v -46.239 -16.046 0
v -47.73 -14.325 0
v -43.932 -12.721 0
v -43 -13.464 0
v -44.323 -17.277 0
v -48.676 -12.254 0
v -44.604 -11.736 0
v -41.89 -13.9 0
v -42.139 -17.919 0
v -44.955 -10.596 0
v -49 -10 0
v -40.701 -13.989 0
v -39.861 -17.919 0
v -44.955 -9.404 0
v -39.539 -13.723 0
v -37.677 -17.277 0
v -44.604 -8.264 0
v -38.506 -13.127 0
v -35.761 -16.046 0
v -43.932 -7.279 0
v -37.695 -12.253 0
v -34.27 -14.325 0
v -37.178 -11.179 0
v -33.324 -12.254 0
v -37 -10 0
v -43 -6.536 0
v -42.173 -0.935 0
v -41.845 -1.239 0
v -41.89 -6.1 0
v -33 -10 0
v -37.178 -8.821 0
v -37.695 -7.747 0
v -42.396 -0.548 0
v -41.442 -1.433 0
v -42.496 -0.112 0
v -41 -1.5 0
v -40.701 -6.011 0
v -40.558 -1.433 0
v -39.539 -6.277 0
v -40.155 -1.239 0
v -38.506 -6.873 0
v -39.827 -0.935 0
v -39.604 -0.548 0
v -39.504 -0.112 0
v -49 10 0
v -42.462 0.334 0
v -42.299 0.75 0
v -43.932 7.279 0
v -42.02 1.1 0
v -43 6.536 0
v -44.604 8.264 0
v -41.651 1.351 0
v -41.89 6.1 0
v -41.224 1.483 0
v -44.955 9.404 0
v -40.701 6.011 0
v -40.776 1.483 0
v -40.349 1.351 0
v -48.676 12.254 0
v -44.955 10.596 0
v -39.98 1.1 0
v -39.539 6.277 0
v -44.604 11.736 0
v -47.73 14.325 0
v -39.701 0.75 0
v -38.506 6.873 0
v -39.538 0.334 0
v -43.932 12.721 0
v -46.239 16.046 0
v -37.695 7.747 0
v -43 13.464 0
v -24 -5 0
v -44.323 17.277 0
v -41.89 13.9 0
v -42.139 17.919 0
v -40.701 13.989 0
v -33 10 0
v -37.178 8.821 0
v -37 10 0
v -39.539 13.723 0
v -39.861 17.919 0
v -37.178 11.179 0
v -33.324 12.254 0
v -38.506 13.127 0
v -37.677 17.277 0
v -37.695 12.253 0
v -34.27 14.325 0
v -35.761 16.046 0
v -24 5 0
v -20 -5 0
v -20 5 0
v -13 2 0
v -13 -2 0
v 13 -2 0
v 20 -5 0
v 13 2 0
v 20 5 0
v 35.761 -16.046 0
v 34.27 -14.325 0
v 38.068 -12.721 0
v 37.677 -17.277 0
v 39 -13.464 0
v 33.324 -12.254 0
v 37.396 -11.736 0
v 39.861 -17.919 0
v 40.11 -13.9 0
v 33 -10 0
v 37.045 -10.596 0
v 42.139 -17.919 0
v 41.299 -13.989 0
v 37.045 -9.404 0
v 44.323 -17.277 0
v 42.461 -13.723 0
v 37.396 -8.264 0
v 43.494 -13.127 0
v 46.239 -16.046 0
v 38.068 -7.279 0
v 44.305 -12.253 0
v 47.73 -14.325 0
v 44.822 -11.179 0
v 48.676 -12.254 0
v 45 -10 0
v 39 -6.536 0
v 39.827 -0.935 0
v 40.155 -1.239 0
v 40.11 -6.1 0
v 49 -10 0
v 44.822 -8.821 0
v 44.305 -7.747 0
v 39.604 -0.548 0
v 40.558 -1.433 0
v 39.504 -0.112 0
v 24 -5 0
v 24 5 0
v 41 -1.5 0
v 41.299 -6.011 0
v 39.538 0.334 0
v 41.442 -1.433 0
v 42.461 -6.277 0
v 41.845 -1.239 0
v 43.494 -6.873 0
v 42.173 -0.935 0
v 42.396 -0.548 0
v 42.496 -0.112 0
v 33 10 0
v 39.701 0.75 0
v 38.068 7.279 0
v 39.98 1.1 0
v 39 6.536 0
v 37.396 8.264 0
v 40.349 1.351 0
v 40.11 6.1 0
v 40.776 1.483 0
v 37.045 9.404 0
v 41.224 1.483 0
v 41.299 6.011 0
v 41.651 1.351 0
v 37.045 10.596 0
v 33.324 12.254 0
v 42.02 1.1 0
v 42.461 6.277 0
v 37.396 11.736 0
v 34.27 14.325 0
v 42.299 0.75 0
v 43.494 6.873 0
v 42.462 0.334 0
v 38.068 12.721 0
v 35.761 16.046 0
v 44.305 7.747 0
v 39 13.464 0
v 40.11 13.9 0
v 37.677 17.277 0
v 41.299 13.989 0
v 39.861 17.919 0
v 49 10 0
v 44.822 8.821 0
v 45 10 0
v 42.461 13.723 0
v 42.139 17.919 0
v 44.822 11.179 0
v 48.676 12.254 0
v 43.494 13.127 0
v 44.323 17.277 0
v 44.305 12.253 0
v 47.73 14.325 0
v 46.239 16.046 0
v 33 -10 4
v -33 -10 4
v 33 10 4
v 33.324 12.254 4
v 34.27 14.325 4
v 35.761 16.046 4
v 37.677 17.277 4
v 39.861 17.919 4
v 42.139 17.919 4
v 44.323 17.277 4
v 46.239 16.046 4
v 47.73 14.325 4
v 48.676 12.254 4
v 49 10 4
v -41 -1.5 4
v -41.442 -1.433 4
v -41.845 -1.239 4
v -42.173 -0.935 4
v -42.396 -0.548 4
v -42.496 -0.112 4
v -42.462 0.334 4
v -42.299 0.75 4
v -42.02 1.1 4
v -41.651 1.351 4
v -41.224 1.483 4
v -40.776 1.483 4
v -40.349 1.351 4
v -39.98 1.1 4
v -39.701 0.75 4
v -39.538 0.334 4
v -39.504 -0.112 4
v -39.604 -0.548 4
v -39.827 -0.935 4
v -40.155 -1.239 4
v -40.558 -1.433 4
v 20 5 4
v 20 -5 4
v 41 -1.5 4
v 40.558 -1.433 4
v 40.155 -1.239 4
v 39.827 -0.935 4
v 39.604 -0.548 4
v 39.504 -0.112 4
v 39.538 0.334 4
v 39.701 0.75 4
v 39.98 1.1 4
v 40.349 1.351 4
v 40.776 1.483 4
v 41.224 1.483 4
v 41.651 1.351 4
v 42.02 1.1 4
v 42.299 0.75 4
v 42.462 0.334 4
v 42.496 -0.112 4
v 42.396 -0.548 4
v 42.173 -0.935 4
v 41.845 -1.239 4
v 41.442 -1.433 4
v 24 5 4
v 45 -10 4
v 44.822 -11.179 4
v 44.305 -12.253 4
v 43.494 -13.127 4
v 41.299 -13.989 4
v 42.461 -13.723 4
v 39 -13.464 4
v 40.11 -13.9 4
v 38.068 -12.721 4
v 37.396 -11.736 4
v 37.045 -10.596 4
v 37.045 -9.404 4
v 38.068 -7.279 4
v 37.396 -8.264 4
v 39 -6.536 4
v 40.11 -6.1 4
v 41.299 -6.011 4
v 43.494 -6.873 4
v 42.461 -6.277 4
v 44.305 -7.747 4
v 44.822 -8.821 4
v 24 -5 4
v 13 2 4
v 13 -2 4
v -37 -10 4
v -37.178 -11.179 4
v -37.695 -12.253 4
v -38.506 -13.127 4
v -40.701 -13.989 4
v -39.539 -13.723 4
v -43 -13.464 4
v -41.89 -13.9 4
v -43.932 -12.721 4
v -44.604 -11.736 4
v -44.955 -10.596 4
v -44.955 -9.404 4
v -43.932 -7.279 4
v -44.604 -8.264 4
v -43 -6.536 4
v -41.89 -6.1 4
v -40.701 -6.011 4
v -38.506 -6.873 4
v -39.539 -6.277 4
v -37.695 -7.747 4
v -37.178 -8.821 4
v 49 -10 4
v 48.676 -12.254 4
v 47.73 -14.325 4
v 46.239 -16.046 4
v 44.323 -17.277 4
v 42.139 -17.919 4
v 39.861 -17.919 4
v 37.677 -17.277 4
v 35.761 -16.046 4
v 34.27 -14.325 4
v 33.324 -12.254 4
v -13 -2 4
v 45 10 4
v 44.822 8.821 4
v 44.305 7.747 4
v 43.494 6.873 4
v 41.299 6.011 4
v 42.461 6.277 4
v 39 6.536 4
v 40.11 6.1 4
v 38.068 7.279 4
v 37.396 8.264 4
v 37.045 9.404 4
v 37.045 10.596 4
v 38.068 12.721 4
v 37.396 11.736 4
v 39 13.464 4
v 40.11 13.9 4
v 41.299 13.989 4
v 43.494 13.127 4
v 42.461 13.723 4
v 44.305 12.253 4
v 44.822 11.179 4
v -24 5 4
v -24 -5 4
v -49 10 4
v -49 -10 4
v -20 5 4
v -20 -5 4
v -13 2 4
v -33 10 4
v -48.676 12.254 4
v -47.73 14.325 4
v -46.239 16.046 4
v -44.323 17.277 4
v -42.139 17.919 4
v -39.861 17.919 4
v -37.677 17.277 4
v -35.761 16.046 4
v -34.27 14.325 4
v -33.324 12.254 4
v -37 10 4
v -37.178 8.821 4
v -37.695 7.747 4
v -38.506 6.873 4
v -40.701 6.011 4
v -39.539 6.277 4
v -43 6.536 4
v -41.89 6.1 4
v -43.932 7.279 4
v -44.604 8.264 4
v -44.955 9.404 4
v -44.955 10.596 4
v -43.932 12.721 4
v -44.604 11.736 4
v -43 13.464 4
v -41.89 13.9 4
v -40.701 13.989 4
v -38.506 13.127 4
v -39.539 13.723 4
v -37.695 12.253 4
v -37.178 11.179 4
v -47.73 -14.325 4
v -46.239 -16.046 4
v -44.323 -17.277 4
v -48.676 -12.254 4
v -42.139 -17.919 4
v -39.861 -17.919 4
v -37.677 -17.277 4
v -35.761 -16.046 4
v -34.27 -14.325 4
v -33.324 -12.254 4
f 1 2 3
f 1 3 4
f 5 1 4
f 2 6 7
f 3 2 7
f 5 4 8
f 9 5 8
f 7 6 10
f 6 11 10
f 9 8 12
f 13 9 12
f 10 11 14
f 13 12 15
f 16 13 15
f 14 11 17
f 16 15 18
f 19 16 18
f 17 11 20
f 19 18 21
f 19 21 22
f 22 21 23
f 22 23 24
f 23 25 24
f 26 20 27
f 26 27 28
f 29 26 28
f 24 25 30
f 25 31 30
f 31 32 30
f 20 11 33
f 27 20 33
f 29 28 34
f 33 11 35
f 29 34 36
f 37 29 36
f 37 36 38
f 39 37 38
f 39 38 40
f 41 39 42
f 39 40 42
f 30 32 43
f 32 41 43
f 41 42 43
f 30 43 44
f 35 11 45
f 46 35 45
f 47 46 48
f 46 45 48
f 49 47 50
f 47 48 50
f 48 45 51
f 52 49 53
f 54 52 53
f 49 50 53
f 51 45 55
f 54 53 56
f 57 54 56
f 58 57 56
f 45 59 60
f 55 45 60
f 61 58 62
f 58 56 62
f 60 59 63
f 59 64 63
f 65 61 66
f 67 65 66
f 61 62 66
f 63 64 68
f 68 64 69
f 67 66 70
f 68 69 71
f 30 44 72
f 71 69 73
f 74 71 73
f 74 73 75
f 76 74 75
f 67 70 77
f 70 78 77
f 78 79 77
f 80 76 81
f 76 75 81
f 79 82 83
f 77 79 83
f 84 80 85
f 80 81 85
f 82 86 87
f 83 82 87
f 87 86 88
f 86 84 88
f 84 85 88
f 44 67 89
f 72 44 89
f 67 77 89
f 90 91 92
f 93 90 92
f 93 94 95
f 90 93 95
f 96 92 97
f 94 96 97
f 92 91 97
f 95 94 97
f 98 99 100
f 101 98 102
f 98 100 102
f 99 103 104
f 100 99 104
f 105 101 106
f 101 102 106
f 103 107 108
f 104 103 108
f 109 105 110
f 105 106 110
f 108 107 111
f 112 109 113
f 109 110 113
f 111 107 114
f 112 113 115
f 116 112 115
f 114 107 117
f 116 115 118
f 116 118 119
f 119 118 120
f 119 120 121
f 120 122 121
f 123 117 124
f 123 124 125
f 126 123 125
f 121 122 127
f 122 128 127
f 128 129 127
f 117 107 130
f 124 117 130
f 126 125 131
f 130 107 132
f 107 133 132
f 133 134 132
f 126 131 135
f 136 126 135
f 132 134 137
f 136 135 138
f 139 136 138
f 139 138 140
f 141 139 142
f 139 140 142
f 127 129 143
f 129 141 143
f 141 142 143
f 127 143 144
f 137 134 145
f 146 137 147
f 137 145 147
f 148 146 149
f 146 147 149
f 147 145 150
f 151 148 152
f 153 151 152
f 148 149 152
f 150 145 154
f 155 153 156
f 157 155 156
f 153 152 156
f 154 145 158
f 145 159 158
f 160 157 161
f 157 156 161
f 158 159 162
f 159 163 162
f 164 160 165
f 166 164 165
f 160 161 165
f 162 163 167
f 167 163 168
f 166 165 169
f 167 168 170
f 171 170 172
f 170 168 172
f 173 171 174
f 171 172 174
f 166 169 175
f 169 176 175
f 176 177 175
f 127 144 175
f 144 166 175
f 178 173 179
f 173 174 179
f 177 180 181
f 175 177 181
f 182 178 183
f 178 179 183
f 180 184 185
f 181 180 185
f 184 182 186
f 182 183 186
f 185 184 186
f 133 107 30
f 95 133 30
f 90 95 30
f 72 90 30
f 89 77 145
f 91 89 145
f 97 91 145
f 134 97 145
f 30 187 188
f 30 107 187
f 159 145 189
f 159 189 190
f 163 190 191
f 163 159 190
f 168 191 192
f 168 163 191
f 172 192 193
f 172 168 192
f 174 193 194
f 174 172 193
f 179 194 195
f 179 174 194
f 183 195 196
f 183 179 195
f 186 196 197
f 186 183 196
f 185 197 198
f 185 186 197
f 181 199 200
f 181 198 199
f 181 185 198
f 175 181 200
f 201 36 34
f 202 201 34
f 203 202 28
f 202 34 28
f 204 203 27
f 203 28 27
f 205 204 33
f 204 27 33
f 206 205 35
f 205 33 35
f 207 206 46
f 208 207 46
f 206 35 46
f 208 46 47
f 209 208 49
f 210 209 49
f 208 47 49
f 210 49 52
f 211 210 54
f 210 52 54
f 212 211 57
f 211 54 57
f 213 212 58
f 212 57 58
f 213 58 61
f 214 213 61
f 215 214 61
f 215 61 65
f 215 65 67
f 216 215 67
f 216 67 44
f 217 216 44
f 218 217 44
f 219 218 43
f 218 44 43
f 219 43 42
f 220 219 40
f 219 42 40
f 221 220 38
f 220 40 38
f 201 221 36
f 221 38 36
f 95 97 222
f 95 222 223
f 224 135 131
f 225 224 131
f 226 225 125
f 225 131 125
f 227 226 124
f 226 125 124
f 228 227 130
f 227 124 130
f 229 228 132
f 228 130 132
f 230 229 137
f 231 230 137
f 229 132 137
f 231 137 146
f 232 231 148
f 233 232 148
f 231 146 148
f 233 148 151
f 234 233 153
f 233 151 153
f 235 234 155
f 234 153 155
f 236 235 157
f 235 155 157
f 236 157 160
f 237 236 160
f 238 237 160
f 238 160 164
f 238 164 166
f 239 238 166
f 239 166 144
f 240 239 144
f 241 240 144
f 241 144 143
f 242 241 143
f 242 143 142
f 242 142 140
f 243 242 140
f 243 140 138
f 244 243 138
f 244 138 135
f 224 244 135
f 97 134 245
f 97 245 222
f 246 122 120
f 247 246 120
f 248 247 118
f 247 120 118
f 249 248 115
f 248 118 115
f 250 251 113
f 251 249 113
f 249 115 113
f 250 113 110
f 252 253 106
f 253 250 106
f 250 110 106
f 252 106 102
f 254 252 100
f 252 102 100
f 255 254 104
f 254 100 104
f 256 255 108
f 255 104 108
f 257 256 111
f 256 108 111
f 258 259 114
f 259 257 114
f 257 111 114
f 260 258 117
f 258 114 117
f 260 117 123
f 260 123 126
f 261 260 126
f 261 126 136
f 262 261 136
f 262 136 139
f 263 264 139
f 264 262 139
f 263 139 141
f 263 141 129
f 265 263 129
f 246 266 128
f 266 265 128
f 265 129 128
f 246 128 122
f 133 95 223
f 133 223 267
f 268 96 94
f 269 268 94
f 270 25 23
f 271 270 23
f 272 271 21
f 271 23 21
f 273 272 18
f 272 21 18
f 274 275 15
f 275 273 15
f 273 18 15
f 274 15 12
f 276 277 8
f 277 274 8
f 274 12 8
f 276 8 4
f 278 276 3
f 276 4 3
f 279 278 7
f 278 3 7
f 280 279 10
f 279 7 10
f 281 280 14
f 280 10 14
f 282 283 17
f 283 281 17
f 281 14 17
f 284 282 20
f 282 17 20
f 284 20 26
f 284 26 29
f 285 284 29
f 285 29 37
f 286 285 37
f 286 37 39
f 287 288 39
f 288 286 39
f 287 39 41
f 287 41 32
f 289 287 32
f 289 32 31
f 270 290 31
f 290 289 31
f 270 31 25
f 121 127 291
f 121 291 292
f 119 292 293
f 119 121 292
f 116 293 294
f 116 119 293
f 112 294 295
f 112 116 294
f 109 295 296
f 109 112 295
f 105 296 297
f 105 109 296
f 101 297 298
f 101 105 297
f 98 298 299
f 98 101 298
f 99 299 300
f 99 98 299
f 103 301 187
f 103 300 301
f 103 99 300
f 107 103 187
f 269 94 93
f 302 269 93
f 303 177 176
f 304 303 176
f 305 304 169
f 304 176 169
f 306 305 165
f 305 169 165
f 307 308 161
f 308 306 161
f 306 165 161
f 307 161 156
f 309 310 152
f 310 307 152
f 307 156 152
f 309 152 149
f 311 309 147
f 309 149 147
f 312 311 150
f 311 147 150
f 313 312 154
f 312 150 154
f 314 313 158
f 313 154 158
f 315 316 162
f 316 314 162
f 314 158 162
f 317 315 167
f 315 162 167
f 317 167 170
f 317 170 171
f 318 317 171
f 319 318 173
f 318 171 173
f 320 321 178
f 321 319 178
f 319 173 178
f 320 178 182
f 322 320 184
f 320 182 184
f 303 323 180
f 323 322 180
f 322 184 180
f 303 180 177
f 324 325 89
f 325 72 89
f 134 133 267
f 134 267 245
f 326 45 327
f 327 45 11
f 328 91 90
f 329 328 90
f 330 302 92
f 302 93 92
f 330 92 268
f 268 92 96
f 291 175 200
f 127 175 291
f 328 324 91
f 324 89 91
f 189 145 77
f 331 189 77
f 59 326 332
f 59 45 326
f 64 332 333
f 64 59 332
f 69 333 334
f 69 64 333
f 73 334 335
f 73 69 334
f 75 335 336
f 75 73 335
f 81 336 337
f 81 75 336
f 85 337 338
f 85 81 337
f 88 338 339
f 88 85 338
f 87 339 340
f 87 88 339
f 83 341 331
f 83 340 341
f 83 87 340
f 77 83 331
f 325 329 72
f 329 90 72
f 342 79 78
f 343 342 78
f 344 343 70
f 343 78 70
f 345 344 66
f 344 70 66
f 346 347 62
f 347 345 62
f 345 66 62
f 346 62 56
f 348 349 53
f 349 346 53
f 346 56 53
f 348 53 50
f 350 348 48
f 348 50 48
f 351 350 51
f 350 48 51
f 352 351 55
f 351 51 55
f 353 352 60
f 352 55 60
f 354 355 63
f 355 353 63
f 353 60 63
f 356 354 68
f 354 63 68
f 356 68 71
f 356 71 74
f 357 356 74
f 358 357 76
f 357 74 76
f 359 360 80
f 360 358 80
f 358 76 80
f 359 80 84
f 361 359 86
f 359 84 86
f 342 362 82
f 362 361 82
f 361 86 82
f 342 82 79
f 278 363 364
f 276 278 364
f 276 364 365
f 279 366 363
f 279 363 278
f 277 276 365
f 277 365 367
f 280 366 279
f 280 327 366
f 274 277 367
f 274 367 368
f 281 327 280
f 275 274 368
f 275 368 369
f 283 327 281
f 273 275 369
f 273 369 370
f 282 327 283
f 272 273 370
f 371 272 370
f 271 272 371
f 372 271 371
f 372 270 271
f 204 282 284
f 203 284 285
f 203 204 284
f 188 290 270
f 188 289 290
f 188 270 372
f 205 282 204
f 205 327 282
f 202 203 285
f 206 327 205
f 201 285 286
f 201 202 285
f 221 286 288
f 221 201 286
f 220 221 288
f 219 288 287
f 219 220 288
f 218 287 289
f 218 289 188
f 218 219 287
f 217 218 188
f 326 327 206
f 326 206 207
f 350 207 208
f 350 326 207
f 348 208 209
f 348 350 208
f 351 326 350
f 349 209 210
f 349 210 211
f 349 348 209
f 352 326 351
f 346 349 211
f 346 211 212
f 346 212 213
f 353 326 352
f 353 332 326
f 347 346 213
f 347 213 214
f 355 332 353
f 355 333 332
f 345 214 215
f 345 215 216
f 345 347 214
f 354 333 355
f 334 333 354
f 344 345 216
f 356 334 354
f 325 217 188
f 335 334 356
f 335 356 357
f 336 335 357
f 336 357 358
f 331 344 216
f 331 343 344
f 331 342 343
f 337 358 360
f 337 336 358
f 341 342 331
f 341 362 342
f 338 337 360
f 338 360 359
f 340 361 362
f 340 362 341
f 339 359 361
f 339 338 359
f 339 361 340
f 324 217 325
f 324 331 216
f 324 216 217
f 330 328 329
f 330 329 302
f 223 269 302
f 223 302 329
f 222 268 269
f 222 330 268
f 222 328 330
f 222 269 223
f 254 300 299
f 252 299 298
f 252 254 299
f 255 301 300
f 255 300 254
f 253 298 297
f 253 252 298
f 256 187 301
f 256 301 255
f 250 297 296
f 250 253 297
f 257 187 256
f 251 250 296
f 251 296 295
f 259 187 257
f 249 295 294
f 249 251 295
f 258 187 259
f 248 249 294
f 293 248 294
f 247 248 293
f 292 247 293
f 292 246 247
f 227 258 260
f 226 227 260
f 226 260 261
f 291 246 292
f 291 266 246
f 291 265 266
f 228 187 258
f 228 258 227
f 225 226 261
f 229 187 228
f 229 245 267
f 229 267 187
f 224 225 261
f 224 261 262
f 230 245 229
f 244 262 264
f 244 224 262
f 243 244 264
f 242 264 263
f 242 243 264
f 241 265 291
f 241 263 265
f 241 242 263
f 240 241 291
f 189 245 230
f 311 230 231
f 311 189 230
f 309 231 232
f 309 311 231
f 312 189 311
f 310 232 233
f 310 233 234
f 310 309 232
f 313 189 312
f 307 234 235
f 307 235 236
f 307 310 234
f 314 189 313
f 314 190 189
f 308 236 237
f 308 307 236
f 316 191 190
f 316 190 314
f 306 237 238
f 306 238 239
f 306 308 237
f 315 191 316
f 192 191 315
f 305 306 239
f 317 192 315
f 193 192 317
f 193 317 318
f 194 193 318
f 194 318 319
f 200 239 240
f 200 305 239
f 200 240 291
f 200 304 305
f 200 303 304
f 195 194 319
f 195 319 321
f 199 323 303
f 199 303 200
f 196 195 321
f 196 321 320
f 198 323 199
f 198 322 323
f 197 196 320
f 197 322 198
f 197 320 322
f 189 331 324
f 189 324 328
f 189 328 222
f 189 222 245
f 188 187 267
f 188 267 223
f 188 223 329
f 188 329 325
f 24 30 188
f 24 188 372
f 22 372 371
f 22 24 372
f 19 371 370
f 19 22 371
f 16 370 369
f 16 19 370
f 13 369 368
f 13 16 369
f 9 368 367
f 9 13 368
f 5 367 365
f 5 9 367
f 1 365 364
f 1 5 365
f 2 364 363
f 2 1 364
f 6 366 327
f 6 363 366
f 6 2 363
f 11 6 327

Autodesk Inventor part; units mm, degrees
ref_plane "YZ Plane" through (0, 0, 0) normal (1, 0, 0) x (0, 1, 0)
ref_plane "XZ Plane" through (0, 0, 0) normal (0, 1, 0) x (-1, 0, 0)
ref_plane "XY Plane" through (0, 0, 0) normal (0, 0, 1) x (1, 0, 0)
sketch "Эскиз1" plane through (0, 0, 0) normal (0, 0, 1) x (1, 0, 0)
  circle A0 centre (-41, -10) radius 4
  circle A1 centre (-41, 10) radius 4
  circle A2 centre (41, 10) radius 4
  circle A3 centre (41, -10) radius 4
  line L0 (-41, 10) -> (41, 10) construction
  line L1 (41, 10) -> (41, -10) construction
  line L2 (41, -10) -> (-41, -10) construction
  line L3 (-41, -10) -> (-41, 10) construction
  arc A4 (-33, 10) -> (-49, 10) centre (-41, 10) ccw
  arc A5 (-49, -10) -> (-33, -10) centre (-41, -10) ccw
  arc A6 (33, -10) -> (49, -10) centre (41, -10) ccw
  arc A7 (49, 10) -> (33, 10) centre (41, 10) ccw
  line L4 (-49, 10) -> (-49, -10)
  line L5 (49, 10) -> (49, -10)
  line L6 (33, 10) -> (-33, 10)
  line L7 (33, -10) -> (-33, -10)
  line L8 (13, -2) -> (-13, -2)
  line L9 (-13, -2) -> (-13, 2)
  line L10 (-13, 2) -> (13, 2)
  line L11 (13, 2) -> (13, -2)
  line L12 (-24, 5) -> (-20, 5)
  line L13 (-20, 5) -> (-20, -5)
  line L14 (-20, -5) -> (-24, -5)
  line L15 (-24, -5) -> (-24, 5)
  line L16 (20, -5) -> (24, -5)
  line L17 (24, -5) -> (24, 5)
  line L18 (24, 5) -> (20, 5)
  line L19 (20, 5) -> (20, -5)
  line L20 (0, -10) -> (0, 10)
  point P0 (0, 0)
  point P1 (41, 0)
  point P2 (0, 2)
  point P3 (13, 0)
  point P4 (-20, 0)
  point P5 (-13, 0)
  dimension "d0" = 8
  dimension "d1" = 20
  dimension "d2" = 82
  dimension "d3" = 8
  dimension "d6" = 10
  dimension "d7" = 10
  dimension "d8" = 4
  dimension "d9" = 26
  dimension "d10" = 10
  dimension "d11" = 40
extrude "Выдавливание1" add sketch "Эскиз1" along normal blind 4 contours L6 L20 L10 L9 L8 L7 A5 L4 A4 | L6 A7 L5 A6 L7 L20 L8 L11 L10
sketch "Эскиз2" plane through (0, 0, 4) normal (0, 0, 1) x (1, 0, 0)
  line L0 (-13, -2) -> (-13, 2) projected
  line L1 (-13, 2) -> (13, 2) projected
  line L2 (13, 2) -> (13, -2) projected
  line L3 (13, -2) -> (-13, -2) projected
  circle A0 centre (41, -10) radius 4 projected
  circle A1 centre (41, 10) radius 4 projected
  circle A2 centre (-41, 10) radius 4 projected
  circle A3 centre (-41, -10) radius 4 projected
  line L4 (20, -5) -> (20, 5) projected
  line L5 (20, 5) -> (24, 5) projected
  line L6 (24, 5) -> (24, -5) projected
  line L7 (24, -5) -> (20, -5) projected
  line L8 (-20, 5) -> (-20, -5) projected
  line L9 (-20, -5) -> (-24, -5) projected
  line L10 (-24, -5) -> (-24, 5) projected
  line L11 (-24, 5) -> (-20, 5) projected
  arc A4 (-33, 10) -> (-49, 10) centre (-41, 10) ccw projected
  line L12 (-49, 10) -> (-49, -10) projected
  arc A5 (-49, -10) -> (-33, -10) centre (-41, -10) ccw projected
  line L13 (-33, -10) -> (33, -10) projected
  arc A6 (33, -10) -> (49, -10) centre (41, -10) ccw projected
  line L14 (49, -10) -> (49, 10) projected
  arc A7 (49, 10) -> (33, 10) centre (41, 10) ccw projected
  line L15 (33, 10) -> (-33, 10) projected
  point P0 (0, 0)
  point P1 (-41, 0)
  point P2 (41, 0)
hole "Отверстие1" at (-41, 0, 4) at (41, 0, 4) direction (0, 0, -1) diameter 3 end through all
properties part number "PistonPart1" material "Дерево (вишня)"
